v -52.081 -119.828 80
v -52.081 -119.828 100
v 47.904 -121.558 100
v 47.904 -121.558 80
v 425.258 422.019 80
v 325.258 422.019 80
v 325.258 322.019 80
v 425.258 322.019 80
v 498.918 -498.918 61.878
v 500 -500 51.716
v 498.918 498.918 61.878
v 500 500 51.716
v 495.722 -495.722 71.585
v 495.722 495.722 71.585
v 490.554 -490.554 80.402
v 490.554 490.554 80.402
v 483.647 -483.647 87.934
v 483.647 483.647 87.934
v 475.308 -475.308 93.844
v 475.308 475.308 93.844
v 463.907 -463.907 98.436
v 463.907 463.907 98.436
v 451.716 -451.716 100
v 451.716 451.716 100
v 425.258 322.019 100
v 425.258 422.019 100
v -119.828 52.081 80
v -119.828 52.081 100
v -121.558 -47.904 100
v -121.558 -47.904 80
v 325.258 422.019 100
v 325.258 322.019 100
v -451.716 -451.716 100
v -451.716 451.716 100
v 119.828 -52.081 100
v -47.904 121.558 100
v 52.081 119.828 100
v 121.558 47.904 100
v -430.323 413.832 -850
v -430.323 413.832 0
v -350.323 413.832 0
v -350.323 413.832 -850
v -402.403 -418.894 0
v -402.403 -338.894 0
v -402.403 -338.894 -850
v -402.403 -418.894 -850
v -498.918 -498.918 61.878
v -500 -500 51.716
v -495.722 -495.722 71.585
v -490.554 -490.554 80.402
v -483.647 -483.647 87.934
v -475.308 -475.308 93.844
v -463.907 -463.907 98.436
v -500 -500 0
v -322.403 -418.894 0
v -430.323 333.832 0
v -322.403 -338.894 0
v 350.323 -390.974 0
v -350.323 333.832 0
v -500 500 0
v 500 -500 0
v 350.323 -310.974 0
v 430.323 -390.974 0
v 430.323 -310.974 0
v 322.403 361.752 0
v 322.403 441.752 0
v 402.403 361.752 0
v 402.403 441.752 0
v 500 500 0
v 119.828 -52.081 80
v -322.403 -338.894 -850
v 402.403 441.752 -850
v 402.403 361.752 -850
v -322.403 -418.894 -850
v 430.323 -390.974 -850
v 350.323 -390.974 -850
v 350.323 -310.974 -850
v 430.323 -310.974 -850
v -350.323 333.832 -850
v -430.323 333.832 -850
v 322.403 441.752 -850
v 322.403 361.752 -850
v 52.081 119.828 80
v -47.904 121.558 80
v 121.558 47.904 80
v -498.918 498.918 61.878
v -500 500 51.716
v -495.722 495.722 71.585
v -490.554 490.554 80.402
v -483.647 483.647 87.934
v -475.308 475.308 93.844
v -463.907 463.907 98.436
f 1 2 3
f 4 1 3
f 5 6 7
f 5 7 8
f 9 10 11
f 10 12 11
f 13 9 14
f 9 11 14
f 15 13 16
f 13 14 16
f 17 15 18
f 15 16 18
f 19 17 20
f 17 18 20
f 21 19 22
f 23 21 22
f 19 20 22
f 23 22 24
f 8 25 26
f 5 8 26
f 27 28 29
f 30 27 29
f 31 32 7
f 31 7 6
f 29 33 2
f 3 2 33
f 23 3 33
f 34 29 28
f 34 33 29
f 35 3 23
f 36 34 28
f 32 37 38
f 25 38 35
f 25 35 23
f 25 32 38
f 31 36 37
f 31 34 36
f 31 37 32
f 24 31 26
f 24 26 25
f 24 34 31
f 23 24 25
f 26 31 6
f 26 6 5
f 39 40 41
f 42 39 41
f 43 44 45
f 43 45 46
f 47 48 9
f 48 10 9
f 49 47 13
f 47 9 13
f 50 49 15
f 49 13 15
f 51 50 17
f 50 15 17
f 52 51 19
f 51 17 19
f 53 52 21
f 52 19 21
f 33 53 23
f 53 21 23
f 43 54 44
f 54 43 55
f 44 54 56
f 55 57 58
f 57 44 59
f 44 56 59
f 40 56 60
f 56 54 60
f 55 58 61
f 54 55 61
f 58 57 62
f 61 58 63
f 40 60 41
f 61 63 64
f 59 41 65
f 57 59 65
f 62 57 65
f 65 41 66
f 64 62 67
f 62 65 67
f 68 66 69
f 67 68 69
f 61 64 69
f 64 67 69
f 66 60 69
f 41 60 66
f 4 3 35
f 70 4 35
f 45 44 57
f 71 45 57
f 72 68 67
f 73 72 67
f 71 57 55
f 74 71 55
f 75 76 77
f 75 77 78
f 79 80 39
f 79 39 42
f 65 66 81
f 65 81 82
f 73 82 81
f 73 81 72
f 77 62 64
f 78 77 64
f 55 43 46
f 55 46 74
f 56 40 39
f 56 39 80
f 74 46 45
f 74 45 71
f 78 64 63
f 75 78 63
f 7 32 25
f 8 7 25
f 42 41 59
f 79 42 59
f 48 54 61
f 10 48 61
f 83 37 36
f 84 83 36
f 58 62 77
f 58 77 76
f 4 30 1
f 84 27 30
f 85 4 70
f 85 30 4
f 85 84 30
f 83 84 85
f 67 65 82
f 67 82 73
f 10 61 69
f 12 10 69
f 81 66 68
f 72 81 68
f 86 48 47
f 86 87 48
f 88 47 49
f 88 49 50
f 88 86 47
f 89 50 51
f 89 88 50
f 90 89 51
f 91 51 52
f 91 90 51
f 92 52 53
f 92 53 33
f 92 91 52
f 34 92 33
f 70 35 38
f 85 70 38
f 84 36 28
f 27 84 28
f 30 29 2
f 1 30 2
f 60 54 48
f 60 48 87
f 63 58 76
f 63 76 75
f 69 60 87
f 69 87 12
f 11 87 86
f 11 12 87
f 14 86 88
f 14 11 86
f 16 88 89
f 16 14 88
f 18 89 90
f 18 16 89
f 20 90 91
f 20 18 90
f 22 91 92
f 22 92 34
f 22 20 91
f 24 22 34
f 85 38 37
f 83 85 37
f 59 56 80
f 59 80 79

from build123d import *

# Parameters (mm, degrees)
F0_W     = 1000
F0_H     = 1000
F1_DEPTH = 100
F2_R     = 48.284271
F4_DEPTH = 20
F5_W     = 100
F5_H     = 100
F6_DEPTH = 20
F7_W     = 80
F7_H     = 80
F8_DEPTH = 850


with BuildPart() as f1:
    # F0 (on Top) → F1 (new body)
    with BuildSketch(Plane.XY):
        Rectangle(F0_W, F0_H)
    extrude(amount=F1_DEPTH)

    # F2
    f2_edges = [f1.edges().sort_by_distance(p)[0] for p in [
        (0, 500, 100),
        (-500, 0, 100),
        (0, -500, 100),
        (500, 0, 100),
    ]]
    fillet(f2_edges, radius=F2_R)

    # F3 (on face) → F4 (cut)
    with BuildSketch(Plane.XY.offset(100)):
        Polygon((-47.904409, 121.557539), (-119.827693, 52.080628), (-121.557539, -47.904409), (-52.080628, -119.827693), (47.904409, -121.557539), (119.827693, -52.080628), (121.557539, 47.904409), (52.080628, 119.827693), align=None)
    extrude(amount=-F4_DEPTH, mode=Mode.SUBTRACT)

    # F5 (on face) → F6 (cut)
    with BuildSketch(Plane.XY.offset(100)):
        with Locations((375.25773, 372.018505)):
            Rectangle(F5_W, F5_H)
    extrude(amount=-F6_DEPTH, mode=Mode.SUBTRACT)

    # F7 (on face) → F8 (join)
    with BuildSketch(Plane(origin=(0, 0, 0), x_dir=(1, 0, 0), z_dir=(0, 0, -1))):
        with Locations((-362.403053, 378.894394)):
            Rectangle(F7_W, F7_H)
        with Locations((390.322966, 350.974482)):
            Rectangle(F7_W, F7_H)
        with Locations((362.403053, -401.751537)):
            Rectangle(F7_W, F7_H)
        with Locations((-390.322966, -373.831624)):
            Rectangle(F7_W, F7_H)
    extrude(amount=F8_DEPTH)


solid = f1.part
